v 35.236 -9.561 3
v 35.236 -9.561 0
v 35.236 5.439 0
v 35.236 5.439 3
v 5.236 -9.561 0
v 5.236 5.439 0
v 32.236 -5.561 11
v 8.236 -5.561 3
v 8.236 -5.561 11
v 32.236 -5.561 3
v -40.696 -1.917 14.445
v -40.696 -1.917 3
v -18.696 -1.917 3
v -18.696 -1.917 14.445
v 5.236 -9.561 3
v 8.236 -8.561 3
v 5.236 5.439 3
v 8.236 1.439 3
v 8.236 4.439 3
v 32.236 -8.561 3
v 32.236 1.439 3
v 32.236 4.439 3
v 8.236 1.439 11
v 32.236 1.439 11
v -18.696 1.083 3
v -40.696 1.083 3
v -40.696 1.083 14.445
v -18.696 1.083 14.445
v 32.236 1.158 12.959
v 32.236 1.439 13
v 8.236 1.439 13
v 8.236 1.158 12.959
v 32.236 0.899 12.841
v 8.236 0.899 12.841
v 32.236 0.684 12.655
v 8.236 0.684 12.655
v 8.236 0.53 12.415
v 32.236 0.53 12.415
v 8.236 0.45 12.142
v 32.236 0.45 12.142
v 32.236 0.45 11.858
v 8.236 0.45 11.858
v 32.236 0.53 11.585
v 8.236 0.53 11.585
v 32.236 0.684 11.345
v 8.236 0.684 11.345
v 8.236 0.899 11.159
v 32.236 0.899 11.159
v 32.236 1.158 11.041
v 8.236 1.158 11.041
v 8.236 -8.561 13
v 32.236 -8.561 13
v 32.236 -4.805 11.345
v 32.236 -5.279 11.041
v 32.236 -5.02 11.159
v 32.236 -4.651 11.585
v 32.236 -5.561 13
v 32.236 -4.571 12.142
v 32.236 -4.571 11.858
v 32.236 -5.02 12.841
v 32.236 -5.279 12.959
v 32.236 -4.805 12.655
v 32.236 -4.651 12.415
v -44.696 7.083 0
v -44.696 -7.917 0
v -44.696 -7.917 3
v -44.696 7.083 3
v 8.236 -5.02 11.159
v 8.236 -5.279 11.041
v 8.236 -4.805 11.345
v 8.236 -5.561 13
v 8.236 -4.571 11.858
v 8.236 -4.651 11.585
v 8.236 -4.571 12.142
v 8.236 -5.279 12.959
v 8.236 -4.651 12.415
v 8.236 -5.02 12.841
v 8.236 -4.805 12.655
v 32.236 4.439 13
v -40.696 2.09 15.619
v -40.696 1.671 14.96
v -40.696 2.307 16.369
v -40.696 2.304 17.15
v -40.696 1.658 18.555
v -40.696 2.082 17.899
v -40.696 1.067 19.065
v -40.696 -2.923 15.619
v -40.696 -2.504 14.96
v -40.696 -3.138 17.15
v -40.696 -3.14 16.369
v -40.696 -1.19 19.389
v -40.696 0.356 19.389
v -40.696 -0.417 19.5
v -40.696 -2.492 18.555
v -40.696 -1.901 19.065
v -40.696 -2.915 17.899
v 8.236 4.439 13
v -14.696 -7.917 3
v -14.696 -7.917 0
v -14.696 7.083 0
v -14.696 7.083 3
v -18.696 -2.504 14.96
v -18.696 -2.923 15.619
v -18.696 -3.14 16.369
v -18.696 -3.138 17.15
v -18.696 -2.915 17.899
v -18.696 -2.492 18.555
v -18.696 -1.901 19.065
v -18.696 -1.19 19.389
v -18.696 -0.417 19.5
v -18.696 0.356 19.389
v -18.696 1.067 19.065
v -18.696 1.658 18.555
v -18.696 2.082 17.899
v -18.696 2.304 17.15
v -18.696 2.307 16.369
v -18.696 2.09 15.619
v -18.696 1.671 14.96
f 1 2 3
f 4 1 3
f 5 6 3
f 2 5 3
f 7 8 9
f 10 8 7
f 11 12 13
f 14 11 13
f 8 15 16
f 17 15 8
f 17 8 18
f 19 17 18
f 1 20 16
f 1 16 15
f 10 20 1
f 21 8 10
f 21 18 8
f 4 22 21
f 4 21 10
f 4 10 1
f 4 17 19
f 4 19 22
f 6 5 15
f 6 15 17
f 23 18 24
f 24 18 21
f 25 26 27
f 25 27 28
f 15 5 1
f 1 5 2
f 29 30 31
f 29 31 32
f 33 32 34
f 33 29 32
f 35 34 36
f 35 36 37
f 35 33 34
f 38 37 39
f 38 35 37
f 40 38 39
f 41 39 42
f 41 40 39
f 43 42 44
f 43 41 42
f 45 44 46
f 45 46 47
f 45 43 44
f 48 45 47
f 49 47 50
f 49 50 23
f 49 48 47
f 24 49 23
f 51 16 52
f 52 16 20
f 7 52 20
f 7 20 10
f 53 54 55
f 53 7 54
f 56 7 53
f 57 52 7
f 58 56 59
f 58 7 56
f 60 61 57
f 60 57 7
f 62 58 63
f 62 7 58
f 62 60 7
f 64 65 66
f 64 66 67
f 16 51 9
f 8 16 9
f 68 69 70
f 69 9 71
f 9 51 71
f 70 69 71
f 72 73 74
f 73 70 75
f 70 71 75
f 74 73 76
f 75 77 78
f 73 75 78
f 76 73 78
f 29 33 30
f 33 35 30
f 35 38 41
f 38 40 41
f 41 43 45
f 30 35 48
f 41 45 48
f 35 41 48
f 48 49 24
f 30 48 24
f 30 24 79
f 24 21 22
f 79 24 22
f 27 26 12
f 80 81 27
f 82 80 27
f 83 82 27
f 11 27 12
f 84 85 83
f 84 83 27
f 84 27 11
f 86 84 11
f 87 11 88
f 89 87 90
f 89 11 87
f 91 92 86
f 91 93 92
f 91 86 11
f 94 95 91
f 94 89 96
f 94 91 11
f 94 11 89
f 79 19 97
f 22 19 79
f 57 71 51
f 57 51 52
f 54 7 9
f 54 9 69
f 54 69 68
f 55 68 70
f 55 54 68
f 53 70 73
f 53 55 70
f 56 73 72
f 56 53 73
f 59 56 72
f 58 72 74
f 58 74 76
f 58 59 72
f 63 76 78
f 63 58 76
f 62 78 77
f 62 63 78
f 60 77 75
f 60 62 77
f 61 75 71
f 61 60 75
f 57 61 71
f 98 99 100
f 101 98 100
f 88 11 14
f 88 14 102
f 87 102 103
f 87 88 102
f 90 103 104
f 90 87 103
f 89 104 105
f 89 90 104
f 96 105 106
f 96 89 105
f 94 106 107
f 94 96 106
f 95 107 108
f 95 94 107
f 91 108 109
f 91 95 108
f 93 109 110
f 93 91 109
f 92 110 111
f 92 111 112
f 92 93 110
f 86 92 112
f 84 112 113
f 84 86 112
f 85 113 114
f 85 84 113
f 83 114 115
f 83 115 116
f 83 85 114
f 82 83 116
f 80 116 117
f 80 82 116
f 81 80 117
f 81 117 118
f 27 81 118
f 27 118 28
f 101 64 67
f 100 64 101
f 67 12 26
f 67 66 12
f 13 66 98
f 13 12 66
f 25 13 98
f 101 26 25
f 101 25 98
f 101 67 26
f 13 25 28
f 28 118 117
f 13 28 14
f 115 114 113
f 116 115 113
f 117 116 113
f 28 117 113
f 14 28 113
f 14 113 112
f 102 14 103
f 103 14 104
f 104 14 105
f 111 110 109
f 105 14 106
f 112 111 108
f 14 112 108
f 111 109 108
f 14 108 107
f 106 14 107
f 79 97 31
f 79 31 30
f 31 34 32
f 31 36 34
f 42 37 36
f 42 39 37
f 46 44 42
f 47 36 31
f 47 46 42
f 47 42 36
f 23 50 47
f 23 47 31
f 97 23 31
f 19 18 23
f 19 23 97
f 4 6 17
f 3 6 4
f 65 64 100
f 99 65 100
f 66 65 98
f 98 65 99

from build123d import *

# Parameters (mm, degrees)
F0_W      = 30
F0_H      = 15
F1_DEPTH  = 3
F2_W      = 24
F2_H      = 3
F3_DEPTH  = 10
F4_R      = 1
F5_DEPTH  = 24
F6_R      = 1
F7_DEPTH  = 24
F8_W      = 22
F8_H      = 3
F9_DEPTH  = 15
F10_R     = 2.75
F11_DEPTH = 22


with BuildPart() as f1:
    # F0 (on Top) → F1 (new body)
    with BuildSketch(Plane.XY):
        with Locations((-29.695525, -0.41682)):
            Rectangle(F0_W, F0_H)
        with Locations((20.23598, -2.060656)):
            Rectangle(F0_W, F0_H)
    extrude(amount=F1_DEPTH)

    # F2 (on face) → F3 (join)
    with BuildSketch(Plane.XY.offset(3)):
        with Locations((20.23598, 2.939344)):
            Rectangle(F2_W, F2_H)
        with Locations((20.23598, -7.060656)):
            Rectangle(F2_W, F2_H)
    extrude(amount=F3_DEPTH)

    # F4 (on face) → F5 (join)
    with BuildSketch(Plane.YZ.offset(32.23598)):
        with Locations((-5.560656, 12)):
            Circle(F4_R)
    extrude(amount=-F5_DEPTH)

    # F6 (on face) → F7 (join)
    with BuildSketch(Plane.YZ.offset(32.23598)):
        with Locations((1.439344, 12)):
            Circle(F6_R)
    extrude(amount=-F7_DEPTH)

    # F8 (on face) → F9 (join)
    with BuildSketch(Plane.XY.offset(3)):
        with Locations((-29.695525, -0.41682)):
            Rectangle(F8_W, F8_H)
    extrude(amount=F9_DEPTH)

    # F10 (on face) → F11 (join)
    with BuildSketch(Plane(origin=(-40.695525, 0, 0), x_dir=(0, -1, 0), z_dir=(-1, 0, 0))):
        with Locations((0.41682, 16.75)):
            Circle(F10_R)
    extrude(amount=-F11_DEPTH)


solid = f1.part
